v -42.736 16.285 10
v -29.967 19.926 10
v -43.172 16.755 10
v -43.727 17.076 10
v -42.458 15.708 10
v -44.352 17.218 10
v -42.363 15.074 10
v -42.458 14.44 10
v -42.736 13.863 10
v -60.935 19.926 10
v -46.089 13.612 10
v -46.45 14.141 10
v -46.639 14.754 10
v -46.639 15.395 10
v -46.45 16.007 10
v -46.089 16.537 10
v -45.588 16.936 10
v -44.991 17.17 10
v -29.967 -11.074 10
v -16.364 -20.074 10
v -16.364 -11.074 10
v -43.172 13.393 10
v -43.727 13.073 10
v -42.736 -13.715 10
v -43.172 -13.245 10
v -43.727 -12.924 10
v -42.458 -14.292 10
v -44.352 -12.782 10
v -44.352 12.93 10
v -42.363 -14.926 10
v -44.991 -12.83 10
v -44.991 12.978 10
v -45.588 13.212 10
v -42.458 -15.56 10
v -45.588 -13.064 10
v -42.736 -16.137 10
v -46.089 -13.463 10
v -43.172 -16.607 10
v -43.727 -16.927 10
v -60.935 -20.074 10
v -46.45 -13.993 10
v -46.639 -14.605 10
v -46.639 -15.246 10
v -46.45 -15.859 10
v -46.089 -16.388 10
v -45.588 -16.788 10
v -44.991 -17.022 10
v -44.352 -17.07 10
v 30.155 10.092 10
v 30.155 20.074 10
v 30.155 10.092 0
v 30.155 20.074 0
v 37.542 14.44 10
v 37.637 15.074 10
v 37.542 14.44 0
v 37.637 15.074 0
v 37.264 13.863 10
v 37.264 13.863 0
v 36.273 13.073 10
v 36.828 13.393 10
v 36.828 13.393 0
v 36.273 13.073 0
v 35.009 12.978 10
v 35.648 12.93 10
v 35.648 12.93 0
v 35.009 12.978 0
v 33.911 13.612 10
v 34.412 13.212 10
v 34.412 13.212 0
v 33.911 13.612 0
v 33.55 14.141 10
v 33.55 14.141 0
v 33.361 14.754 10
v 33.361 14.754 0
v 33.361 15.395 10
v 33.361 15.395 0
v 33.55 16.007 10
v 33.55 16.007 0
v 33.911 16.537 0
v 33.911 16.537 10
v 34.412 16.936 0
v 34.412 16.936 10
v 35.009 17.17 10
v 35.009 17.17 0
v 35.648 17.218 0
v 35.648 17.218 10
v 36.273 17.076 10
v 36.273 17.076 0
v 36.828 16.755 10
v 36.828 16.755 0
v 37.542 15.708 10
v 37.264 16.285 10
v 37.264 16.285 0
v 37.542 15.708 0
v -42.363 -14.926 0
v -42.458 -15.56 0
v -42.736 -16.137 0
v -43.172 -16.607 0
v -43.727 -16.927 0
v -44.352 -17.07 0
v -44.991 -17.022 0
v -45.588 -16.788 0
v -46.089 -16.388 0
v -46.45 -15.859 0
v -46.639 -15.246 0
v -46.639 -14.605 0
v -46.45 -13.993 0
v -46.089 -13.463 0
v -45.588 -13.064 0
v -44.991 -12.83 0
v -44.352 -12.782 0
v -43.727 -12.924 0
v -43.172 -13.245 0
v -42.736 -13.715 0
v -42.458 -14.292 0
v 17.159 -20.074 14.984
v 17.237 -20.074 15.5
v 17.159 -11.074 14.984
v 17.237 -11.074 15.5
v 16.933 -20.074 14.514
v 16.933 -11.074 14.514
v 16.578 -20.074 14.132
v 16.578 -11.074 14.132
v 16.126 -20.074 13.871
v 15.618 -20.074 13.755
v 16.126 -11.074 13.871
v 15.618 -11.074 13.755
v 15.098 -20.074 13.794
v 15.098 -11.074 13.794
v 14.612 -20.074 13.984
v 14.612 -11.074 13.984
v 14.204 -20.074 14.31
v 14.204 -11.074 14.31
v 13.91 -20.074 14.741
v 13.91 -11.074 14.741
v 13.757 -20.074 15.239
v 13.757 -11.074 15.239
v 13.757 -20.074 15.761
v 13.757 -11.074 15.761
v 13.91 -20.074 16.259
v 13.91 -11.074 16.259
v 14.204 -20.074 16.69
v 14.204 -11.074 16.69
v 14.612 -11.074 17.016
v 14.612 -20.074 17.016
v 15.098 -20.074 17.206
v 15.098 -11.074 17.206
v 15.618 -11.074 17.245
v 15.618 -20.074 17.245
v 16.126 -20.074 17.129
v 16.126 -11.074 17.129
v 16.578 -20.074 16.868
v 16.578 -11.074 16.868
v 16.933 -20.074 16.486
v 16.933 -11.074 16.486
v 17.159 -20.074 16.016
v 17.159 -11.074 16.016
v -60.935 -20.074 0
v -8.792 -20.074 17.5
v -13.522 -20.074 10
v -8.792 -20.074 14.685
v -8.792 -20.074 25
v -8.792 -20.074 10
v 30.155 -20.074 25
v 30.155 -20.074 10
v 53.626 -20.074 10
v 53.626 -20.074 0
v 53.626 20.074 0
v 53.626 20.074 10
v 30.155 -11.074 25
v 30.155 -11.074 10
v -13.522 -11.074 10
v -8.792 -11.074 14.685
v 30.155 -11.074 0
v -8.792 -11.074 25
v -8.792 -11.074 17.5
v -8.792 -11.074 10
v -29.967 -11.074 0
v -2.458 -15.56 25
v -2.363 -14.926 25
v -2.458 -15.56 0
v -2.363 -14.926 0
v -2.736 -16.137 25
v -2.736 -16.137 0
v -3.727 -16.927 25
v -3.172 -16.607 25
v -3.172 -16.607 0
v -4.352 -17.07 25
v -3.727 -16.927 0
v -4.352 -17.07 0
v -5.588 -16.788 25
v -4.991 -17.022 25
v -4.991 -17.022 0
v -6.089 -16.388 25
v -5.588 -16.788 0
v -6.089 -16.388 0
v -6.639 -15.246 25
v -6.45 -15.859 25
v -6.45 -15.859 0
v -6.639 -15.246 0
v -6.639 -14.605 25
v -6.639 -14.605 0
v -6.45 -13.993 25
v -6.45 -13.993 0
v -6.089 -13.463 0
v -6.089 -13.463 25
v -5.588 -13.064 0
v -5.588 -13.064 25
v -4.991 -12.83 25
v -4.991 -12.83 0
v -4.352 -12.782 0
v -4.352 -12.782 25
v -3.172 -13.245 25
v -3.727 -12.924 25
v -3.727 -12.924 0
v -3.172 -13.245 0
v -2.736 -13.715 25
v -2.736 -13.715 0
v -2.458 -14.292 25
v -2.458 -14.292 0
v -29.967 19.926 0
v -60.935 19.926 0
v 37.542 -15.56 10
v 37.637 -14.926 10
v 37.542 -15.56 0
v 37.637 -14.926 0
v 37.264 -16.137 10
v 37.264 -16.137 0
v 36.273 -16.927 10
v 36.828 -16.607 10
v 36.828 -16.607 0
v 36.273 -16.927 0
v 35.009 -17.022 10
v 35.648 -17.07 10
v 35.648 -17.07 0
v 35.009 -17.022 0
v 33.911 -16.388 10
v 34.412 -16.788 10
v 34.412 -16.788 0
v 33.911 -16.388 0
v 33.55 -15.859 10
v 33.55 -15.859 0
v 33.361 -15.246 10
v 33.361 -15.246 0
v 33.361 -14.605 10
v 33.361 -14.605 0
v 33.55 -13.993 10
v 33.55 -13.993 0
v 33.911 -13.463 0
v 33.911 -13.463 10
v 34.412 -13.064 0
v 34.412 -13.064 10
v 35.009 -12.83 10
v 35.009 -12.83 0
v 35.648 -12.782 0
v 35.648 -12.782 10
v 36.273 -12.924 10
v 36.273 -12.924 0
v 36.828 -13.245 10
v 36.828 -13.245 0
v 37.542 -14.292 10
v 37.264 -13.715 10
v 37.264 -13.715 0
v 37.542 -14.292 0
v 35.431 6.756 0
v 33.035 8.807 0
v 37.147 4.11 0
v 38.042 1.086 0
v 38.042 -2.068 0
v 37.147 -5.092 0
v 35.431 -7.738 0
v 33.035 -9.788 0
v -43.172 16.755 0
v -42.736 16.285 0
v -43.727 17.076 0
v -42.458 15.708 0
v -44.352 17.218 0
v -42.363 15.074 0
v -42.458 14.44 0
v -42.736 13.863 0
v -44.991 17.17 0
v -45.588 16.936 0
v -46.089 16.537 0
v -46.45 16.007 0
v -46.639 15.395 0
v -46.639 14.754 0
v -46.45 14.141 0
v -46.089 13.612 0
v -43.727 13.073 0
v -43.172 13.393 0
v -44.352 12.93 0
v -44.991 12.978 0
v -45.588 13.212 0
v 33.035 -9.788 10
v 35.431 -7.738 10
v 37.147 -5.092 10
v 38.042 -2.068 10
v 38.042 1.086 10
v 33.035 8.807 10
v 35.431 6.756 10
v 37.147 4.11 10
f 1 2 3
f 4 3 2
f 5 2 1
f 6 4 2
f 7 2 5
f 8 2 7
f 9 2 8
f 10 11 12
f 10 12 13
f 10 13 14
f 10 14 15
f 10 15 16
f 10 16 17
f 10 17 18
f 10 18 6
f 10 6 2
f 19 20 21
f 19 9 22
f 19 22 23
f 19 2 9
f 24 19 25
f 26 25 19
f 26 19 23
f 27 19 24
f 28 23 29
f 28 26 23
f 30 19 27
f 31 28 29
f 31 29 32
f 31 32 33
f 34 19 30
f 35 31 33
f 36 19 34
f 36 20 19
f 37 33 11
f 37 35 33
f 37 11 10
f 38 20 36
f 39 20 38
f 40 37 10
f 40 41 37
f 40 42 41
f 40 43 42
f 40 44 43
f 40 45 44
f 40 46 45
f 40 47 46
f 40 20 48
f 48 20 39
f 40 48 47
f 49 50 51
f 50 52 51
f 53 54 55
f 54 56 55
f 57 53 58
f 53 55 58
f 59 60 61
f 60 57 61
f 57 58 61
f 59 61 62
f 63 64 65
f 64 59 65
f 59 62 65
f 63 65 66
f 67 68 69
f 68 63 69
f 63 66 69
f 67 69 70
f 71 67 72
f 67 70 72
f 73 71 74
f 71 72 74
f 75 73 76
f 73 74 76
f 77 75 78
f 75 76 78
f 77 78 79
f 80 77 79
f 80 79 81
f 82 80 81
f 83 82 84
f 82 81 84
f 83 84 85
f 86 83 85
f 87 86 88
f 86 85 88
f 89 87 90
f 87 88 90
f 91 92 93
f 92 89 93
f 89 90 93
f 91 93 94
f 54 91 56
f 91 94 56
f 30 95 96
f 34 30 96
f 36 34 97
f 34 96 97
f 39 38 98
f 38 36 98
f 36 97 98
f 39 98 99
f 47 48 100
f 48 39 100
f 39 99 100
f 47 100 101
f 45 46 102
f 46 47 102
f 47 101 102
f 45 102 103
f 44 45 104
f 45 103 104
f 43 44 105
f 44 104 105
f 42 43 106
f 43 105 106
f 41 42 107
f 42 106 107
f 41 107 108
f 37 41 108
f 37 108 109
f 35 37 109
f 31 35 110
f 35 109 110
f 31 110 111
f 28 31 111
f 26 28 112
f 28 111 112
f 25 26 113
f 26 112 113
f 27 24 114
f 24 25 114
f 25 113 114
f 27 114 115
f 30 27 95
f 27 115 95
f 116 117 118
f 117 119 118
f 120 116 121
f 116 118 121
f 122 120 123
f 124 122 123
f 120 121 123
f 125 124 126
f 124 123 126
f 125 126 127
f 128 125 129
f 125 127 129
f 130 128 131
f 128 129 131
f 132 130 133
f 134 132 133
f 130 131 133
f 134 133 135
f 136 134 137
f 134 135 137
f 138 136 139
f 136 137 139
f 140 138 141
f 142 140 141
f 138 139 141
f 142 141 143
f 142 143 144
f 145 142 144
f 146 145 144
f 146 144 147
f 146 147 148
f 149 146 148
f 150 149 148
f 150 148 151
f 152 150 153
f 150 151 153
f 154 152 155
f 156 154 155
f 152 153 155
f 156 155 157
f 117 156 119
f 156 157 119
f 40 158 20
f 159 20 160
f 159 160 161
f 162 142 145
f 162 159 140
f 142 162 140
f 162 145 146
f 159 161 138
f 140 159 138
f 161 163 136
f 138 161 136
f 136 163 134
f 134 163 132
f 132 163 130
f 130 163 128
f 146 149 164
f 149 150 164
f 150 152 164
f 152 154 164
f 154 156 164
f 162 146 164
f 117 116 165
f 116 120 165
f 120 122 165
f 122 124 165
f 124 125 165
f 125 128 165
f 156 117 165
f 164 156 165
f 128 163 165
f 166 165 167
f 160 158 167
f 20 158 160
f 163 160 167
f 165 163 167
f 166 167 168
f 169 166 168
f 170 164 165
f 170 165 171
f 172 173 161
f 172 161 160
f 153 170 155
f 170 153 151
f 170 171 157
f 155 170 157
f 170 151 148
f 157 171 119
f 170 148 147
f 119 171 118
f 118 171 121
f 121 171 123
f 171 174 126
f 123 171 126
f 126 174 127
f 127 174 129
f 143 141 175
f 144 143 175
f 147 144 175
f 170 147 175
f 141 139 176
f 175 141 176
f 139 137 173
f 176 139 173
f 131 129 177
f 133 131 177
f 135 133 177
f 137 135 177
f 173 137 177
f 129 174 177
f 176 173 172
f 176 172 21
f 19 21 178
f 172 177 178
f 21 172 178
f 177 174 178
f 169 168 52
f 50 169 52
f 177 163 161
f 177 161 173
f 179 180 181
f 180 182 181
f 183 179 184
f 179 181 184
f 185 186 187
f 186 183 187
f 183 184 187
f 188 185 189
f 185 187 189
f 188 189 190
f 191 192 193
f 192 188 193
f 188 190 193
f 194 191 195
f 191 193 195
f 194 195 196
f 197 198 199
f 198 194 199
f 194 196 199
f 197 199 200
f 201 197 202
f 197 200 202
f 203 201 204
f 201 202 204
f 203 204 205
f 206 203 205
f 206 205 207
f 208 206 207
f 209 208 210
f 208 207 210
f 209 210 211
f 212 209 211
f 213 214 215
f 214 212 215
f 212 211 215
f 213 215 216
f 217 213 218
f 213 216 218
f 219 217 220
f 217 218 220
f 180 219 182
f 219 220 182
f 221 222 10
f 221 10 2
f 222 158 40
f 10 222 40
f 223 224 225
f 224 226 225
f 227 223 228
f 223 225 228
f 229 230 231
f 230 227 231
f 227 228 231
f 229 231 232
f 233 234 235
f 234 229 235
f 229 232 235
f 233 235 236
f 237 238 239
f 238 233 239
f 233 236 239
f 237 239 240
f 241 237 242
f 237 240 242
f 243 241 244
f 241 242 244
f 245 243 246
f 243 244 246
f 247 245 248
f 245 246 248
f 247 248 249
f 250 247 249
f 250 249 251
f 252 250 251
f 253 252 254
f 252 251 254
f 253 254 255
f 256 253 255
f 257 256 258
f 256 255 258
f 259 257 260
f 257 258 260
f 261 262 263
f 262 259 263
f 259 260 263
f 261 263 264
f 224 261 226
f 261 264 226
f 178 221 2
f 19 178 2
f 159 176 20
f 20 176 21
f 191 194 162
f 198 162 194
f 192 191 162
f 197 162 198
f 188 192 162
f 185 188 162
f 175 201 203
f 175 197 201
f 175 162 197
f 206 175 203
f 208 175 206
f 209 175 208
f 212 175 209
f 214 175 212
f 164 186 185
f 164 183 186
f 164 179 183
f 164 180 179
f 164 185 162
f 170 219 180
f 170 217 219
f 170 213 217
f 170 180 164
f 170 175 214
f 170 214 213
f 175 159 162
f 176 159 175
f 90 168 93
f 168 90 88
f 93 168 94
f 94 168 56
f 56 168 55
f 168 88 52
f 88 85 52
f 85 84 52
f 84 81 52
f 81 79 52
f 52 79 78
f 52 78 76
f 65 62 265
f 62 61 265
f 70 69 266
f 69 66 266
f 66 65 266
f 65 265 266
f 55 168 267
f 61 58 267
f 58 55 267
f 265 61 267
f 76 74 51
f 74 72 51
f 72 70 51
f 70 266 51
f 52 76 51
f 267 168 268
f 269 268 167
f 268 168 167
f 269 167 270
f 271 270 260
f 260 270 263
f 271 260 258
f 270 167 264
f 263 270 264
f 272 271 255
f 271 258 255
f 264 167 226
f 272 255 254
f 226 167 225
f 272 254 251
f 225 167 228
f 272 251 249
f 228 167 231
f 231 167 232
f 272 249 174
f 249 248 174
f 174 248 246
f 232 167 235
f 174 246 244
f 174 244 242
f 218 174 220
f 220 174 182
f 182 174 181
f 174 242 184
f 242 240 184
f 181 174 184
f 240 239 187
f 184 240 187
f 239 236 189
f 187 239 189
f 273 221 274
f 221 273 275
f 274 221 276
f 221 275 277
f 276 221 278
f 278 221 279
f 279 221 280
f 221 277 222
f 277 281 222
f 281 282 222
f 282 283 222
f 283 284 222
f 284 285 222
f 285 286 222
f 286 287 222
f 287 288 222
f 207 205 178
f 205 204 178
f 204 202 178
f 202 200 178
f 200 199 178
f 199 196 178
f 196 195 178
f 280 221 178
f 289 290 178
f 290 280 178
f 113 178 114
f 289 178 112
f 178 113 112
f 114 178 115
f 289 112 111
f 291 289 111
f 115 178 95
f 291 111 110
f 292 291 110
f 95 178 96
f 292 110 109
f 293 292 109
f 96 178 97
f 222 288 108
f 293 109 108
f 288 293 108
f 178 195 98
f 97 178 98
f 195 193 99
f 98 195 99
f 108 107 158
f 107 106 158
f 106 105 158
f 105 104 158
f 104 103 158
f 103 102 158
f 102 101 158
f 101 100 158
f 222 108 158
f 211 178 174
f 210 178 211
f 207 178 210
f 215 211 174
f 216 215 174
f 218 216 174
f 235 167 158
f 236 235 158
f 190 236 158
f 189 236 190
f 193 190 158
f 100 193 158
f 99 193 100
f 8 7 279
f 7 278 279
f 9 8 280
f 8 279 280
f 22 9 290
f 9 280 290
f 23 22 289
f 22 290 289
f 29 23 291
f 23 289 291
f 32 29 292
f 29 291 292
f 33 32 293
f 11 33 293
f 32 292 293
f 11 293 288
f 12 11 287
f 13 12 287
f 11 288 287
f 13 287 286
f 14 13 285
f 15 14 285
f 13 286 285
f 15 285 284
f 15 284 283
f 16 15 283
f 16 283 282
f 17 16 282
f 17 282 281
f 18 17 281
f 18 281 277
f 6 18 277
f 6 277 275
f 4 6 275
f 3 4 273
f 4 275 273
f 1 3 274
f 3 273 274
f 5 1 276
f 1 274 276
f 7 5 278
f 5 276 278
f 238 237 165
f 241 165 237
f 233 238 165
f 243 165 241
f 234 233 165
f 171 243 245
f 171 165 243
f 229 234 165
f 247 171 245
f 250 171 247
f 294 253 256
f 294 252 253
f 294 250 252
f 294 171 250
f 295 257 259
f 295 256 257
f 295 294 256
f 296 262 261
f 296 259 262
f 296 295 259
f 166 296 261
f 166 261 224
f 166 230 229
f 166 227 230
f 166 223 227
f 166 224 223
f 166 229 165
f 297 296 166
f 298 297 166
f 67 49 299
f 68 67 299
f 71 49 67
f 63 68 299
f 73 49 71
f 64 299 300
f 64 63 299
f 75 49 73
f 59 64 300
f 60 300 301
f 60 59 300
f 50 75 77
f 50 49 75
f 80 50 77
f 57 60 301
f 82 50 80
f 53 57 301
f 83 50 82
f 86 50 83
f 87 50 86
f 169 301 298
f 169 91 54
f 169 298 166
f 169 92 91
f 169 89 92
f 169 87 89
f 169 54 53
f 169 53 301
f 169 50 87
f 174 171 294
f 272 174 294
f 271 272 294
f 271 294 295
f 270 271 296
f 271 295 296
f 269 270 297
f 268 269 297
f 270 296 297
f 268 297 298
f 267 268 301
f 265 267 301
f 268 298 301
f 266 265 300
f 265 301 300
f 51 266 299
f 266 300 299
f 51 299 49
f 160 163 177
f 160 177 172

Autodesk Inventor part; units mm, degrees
ref_plane "YZ Plane" through (0, 0, 0) normal (1, 0, 0) x (0, 1, 0)
ref_plane "XZ Plane" through (0, 0, 0) normal (0, 1, 0) x (-1, 0, 0)
ref_plane "XY Plane" through (0, 0, 0) normal (0, 0, 1) x (1, 0, 0)
sketch "Esquisse1" plane through (0, 0, 0) normal (0, 0, 1) x (1, 0, 0)
  line L0 (30.1547, 20.0742) -> (30.1547, 11.0742) projected
  line L1 (30.1547, 11.0742) -> (49.0652, 11.0742) projected
  line L2 (49.0652, 11.0742) -> (49.0652, -11.0742) projected
  line L3 (49.0652, -11.0742) -> (-60.9348, -11.0742) projected
  line L4 (-60.9348, -11.0742) -> (-60.9348, -20.0742) projected
  line L5 (-60.9348, -20.0742) -> (53.6264, -20.0742) projected
  line L6 (53.6264, -20.0742) -> (53.6264, 20.0742) projected
  line L7 (53.6264, 20.0742) -> (30.1547, 20.0742) projected
  circle A0 centre (35.4871, 15.0742) radius 2.15 projected
  circle A1 centre (-44.5129, -14.9258) radius 2.15 projected
  circle A2 centre (-4.5129, -14.9258) radius 2.15 projected
  circle A3 centre (35.4871, -14.9258) radius 2.15 projected
  line L8 (30.1547, 11.0742) -> (30.1547, -11.0742)
  point P0 (0, 0)
extrude "Extrusion1" add sketch "Esquisse1" along normal blind 10
sketch "Esquisse2" plane through (0, 0, 10) normal (0, 0, 1) x (1, 0, 0)
  circle A0 centre (35.4871, -14.9258) radius 2.15 projected
  circle A1 centre (-4.5129, -14.9258) radius 2.15 projected
  circle A2 centre (-44.5129, -14.9258) radius 2.15 projected
  circle A3 centre (35.4871, 15.0742) radius 2.15 projected
  line L0 (30.1547, 20.0742) -> (30.1547, -11.0742) projected
  line L1 (30.1547, -11.0742) -> (-60.9348, -11.0742) projected
  line L2 (-60.9348, -11.0742) -> (-60.9348, -20.0742) projected
  line L3 (-60.9348, -20.0742) -> (53.6264, -20.0742) projected
  line L4 (53.6264, -20.0742) -> (53.6264, 20.0742) projected
  line L5 (53.6264, 20.0742) -> (30.1547, 20.0742) projected
  line L6 (-60.9348, -20.0742) -> (53.6264, -20.0742) projected
  line L7 (30.1547, -20.0742) -> (30.1547, -11.0742)
  line L8 (-60.9348, -20.0742) -> (53.6264, -20.0742) projected
  line L9 (-8.7922, -20.0742) -> (-8.7922, -11.0742)
  line L10 (30.1547, -11.0742) -> (-60.9348, -11.0742) projected
  point P0 (0, 0)
extrude "Extrusion2" add sketch "Esquisse2" along normal blind 15 contours L7 L3 L9 L1
sketch "Esquisse3" plane through (-60.9348, -11.0742, 0) normal (0, 1, 0) x (1, 0, 0)
  line L0 (91.0895, 0) -> (91.0895, -10) projected
  line L1 (91.0895, 0) -> (0, 0) projected
  line L2 (0, 0) -> (0, -10) projected
  line L3 (52.1426, -10) -> (0, -10) projected
  line L4 (52.1426, -10) -> (52.1426, -25) projected
  line L5 (91.0895, -25) -> (52.1426, -25) projected
  line L6 (91.0895, -10) -> (91.0895, -25) projected
  line L7 (91.0895, 0) -> (0, 0) projected
  line L8 (30.9674, 0) -> (30.9674, -10)
  point P0 (60.9348, 0)
extrude "Extrusion3" add sketch "Esquisse3" along normal blind 31 contours L8 L3 L2 L1
ref_plane "Plan de construction1" through (0, 0, 0) normal (0, 0, 1) x (1, 0, 0)
sketch "Esquisse4" plane through (0, 0, 0) normal (0, 0, 1) x (1, 0, 0)
  point P0 (0, 0)
sketch "Esquisse5" plane through (0, 0, 0) normal (0, 0, 1) x (1, 0, 0)
  circle A0 centre (-44.5129, 15.0742) radius 2.15 projected
  point P0 (0, 0)
extrude "Extrusion4" cut sketch "Esquisse5" along normal blind 31
sketch "Esquisse6" plane through (-8.7922, -11.0742, 25) normal (0, 1, 0) x (1, 0, 0)
  line L0 (6.4293, 0) -> (2.1293, 0) projected
  line L1 (4.2793, 0) -> (4.2793, 25) construction
  line L2 (2.1293, 25) -> (6.4293, 25) projected
  line L3 (4.2793, 25) -> (4.2793, 9.5)
  line L4 (4.2793, 9.5) -> (24.2793, 9.5) construction
  circle A0 centre (24.2793, 9.5) radius 1.75
  point P0 (8.7922, 25)
  dimension "d8" = 15.5
  dimension "d9" = 20
  dimension "d10" = 3.5
extrude "Extrusion5" cut sketch "Esquisse6" against normal blind 10
sketch "Esquisse7" plane through (0, 0, 10) normal (0, 0, 1) x (1, 0, 0)
  line L0 (30.1547, -11.0742) -> (30.1547, -20.0742) projected
  line L1 (30.1547, 20.0742) -> (30.1547, -11.0742) projected
  arc A0 (30.1547, -11.0742) -> (30.1547, 10.0925) centre (27.156, -0.4909) ccw
  line L2 (30.1547, -11.0742) -> (-29.9674, -11.0742) projected
  line L3 (30.1547, -11.0742) -> (30.1547, 10.0925)
  point P0 (0, 0)
  dimension "d13" = 11
extrude "Extrusion6" cut sketch "Esquisse7" against normal blind 10
sketch "Esquisse8" plane through (-8.7922, -11.0742, 25) normal (0, 1, 0) x (1, 0, 0)
  line L0 (0, 15) -> (0, 0) projected
  line L1 (0, 7.5) -> (-7.5714, 15)
  line L2 (0, 15) -> (-21.1752, 15) projected
  line L3 (0, 10.3151) -> (-4.7295, 15)
  point P0 (8.7922, 25)
  dimension "d16" = 2
extrude "Extrusion7" add sketch "Esquisse8" against normal blind 9 contours L0 L1 L2 L3
properties part number "Aide_rotate"
